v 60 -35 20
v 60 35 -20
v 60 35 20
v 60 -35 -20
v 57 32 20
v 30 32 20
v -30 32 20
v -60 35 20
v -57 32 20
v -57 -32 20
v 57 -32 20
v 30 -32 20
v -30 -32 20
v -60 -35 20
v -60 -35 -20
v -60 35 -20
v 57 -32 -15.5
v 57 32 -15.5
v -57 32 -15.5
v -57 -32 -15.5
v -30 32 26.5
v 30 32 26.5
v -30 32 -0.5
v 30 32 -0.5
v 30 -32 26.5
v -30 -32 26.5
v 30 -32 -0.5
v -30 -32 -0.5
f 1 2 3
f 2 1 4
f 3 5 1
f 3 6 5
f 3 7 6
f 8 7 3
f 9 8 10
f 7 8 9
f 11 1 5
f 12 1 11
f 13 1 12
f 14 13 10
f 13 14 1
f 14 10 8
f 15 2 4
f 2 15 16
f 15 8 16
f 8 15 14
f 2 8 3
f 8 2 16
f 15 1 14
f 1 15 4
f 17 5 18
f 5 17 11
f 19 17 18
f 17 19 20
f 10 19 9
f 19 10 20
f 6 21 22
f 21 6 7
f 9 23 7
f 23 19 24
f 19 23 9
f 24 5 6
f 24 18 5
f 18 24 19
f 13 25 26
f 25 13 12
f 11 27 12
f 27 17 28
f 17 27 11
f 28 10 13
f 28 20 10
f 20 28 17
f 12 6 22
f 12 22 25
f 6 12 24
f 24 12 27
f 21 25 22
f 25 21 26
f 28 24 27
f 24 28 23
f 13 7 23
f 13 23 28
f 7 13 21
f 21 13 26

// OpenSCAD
// Buffer tank for mini horizontal gel-electrophoresis box
// Dimensions in millimetres (mm)

// Outer dimensions
outer_x = 120;
outer_y = 70;
outer_z = 40;

// Wall and floor thickness
wall_thickness = 3;
floor_thickness = 3;

// Platform dimensions
platform_length_x = 60;
platform_height_offset = 10; // Height above inner floor
platform_width_y = outer_y - 2 * wall_thickness; // Spans full inner width

// Electrode hole dimensions
hole_diameter = 2;
hole_z = 30;
hole_y = 0;

// Calculate inner dimensions
inner_x = outer_x - 2 * wall_thickness;
inner_y = outer_y - 2 * wall_thickness;
inner_z = outer_z - floor_thickness;

// Calculate platform top Z position
platform_top_z = floor_thickness + platform_height_offset;

// Calculate hole position relative to bottom
// Hole is at z=30, floor is at z=0, so hole is 30mm from bottom
// Wall thickness is 3mm, so inner wall is at 3mm
// Hole is drilled through the end walls (X ends)

module tank_body() {
    // Main tank shell (outer box)
    difference() {
        // Outer solid block
        cube([outer_x, outer_y, outer_z], center = true);
        
        // Subtract inner cavity
        translate([0, 0, floor_thickness])
            cube([inner_x, inner_y, inner_z], center = true);
    }
}

module platform() {
    // Platform is a solid block
    // Centered in X, spans full inner Y, height from floor + offset
    translate([0, 0, floor_thickness + platform_height_offset])
        cube([platform_length_x, platform_width_y, inner_z - platform_height_offset], center = true);
}

module electrode_holes() {
    // Two holes, one at each X end (left and right)
    // Hole center at y=0, z=30
    // Hole diameter 2mm
    
    // Left hole (at x = -outer_x/2)
    translate([-outer_x/2, 0, hole_z])
        cylinder(d = hole_diameter, h = outer_y + 10, center = true);
        
    // Right hole (at x = +outer_x/2)
    translate([outer_x/2, 0, hole_z])
        cylinder(d = hole_diameter, h = outer_y + 10, center = true);
}

// Main assembly
union() {
    // Tank body
    tank_body();
    
    // Raised platform
    platform();
    
    // Electrode holes (cut out from the tank)
    // We need to subtract the holes from the tank body
    // The holes go through the end walls, so we subtract them from the main body
    // Since the platform is inside, we need to ensure the holes don't cut the platform
    // The platform is at z=13 to z=23 (floor=3, height=10, so top=13, bottom=3)
    // The holes are at z=30, so they are above the platform, no conflict
    
    // Subtract the holes from the tank body
    difference() {
        tank_body();
        electrode_holes();
    }
}

// Final assembly: Tank body with platform and holes
// We need to combine the tank body (with holes) and the platform
// The platform is inside the tank, so we union them

// Create the final part
union() {
    // Tank body with holes
    difference() {
        // Outer tank
        cube([outer_x, outer_y, outer_z], center = true);
        // Inner cavity
        translate([0, 0, floor_thickness])
            cube([inner_x, inner_y, inner_z], center = true);
        // Electrode holes
        translate([-outer_x/2, 0, hole_z])
            cylinder(d = hole_diameter, h = outer_y + 10, center = true);
        translate([outer_x/2, 0, hole_z])
            cylinder(d = hole_diameter, h = outer_y + 10, center = true);
    }
    
    // Platform
    translate([0, 0, floor_thickness + platform_height_offset])
        cube([platform_length_x, platform_width_y, inner_z - platform_height_offset], center = true);
}
